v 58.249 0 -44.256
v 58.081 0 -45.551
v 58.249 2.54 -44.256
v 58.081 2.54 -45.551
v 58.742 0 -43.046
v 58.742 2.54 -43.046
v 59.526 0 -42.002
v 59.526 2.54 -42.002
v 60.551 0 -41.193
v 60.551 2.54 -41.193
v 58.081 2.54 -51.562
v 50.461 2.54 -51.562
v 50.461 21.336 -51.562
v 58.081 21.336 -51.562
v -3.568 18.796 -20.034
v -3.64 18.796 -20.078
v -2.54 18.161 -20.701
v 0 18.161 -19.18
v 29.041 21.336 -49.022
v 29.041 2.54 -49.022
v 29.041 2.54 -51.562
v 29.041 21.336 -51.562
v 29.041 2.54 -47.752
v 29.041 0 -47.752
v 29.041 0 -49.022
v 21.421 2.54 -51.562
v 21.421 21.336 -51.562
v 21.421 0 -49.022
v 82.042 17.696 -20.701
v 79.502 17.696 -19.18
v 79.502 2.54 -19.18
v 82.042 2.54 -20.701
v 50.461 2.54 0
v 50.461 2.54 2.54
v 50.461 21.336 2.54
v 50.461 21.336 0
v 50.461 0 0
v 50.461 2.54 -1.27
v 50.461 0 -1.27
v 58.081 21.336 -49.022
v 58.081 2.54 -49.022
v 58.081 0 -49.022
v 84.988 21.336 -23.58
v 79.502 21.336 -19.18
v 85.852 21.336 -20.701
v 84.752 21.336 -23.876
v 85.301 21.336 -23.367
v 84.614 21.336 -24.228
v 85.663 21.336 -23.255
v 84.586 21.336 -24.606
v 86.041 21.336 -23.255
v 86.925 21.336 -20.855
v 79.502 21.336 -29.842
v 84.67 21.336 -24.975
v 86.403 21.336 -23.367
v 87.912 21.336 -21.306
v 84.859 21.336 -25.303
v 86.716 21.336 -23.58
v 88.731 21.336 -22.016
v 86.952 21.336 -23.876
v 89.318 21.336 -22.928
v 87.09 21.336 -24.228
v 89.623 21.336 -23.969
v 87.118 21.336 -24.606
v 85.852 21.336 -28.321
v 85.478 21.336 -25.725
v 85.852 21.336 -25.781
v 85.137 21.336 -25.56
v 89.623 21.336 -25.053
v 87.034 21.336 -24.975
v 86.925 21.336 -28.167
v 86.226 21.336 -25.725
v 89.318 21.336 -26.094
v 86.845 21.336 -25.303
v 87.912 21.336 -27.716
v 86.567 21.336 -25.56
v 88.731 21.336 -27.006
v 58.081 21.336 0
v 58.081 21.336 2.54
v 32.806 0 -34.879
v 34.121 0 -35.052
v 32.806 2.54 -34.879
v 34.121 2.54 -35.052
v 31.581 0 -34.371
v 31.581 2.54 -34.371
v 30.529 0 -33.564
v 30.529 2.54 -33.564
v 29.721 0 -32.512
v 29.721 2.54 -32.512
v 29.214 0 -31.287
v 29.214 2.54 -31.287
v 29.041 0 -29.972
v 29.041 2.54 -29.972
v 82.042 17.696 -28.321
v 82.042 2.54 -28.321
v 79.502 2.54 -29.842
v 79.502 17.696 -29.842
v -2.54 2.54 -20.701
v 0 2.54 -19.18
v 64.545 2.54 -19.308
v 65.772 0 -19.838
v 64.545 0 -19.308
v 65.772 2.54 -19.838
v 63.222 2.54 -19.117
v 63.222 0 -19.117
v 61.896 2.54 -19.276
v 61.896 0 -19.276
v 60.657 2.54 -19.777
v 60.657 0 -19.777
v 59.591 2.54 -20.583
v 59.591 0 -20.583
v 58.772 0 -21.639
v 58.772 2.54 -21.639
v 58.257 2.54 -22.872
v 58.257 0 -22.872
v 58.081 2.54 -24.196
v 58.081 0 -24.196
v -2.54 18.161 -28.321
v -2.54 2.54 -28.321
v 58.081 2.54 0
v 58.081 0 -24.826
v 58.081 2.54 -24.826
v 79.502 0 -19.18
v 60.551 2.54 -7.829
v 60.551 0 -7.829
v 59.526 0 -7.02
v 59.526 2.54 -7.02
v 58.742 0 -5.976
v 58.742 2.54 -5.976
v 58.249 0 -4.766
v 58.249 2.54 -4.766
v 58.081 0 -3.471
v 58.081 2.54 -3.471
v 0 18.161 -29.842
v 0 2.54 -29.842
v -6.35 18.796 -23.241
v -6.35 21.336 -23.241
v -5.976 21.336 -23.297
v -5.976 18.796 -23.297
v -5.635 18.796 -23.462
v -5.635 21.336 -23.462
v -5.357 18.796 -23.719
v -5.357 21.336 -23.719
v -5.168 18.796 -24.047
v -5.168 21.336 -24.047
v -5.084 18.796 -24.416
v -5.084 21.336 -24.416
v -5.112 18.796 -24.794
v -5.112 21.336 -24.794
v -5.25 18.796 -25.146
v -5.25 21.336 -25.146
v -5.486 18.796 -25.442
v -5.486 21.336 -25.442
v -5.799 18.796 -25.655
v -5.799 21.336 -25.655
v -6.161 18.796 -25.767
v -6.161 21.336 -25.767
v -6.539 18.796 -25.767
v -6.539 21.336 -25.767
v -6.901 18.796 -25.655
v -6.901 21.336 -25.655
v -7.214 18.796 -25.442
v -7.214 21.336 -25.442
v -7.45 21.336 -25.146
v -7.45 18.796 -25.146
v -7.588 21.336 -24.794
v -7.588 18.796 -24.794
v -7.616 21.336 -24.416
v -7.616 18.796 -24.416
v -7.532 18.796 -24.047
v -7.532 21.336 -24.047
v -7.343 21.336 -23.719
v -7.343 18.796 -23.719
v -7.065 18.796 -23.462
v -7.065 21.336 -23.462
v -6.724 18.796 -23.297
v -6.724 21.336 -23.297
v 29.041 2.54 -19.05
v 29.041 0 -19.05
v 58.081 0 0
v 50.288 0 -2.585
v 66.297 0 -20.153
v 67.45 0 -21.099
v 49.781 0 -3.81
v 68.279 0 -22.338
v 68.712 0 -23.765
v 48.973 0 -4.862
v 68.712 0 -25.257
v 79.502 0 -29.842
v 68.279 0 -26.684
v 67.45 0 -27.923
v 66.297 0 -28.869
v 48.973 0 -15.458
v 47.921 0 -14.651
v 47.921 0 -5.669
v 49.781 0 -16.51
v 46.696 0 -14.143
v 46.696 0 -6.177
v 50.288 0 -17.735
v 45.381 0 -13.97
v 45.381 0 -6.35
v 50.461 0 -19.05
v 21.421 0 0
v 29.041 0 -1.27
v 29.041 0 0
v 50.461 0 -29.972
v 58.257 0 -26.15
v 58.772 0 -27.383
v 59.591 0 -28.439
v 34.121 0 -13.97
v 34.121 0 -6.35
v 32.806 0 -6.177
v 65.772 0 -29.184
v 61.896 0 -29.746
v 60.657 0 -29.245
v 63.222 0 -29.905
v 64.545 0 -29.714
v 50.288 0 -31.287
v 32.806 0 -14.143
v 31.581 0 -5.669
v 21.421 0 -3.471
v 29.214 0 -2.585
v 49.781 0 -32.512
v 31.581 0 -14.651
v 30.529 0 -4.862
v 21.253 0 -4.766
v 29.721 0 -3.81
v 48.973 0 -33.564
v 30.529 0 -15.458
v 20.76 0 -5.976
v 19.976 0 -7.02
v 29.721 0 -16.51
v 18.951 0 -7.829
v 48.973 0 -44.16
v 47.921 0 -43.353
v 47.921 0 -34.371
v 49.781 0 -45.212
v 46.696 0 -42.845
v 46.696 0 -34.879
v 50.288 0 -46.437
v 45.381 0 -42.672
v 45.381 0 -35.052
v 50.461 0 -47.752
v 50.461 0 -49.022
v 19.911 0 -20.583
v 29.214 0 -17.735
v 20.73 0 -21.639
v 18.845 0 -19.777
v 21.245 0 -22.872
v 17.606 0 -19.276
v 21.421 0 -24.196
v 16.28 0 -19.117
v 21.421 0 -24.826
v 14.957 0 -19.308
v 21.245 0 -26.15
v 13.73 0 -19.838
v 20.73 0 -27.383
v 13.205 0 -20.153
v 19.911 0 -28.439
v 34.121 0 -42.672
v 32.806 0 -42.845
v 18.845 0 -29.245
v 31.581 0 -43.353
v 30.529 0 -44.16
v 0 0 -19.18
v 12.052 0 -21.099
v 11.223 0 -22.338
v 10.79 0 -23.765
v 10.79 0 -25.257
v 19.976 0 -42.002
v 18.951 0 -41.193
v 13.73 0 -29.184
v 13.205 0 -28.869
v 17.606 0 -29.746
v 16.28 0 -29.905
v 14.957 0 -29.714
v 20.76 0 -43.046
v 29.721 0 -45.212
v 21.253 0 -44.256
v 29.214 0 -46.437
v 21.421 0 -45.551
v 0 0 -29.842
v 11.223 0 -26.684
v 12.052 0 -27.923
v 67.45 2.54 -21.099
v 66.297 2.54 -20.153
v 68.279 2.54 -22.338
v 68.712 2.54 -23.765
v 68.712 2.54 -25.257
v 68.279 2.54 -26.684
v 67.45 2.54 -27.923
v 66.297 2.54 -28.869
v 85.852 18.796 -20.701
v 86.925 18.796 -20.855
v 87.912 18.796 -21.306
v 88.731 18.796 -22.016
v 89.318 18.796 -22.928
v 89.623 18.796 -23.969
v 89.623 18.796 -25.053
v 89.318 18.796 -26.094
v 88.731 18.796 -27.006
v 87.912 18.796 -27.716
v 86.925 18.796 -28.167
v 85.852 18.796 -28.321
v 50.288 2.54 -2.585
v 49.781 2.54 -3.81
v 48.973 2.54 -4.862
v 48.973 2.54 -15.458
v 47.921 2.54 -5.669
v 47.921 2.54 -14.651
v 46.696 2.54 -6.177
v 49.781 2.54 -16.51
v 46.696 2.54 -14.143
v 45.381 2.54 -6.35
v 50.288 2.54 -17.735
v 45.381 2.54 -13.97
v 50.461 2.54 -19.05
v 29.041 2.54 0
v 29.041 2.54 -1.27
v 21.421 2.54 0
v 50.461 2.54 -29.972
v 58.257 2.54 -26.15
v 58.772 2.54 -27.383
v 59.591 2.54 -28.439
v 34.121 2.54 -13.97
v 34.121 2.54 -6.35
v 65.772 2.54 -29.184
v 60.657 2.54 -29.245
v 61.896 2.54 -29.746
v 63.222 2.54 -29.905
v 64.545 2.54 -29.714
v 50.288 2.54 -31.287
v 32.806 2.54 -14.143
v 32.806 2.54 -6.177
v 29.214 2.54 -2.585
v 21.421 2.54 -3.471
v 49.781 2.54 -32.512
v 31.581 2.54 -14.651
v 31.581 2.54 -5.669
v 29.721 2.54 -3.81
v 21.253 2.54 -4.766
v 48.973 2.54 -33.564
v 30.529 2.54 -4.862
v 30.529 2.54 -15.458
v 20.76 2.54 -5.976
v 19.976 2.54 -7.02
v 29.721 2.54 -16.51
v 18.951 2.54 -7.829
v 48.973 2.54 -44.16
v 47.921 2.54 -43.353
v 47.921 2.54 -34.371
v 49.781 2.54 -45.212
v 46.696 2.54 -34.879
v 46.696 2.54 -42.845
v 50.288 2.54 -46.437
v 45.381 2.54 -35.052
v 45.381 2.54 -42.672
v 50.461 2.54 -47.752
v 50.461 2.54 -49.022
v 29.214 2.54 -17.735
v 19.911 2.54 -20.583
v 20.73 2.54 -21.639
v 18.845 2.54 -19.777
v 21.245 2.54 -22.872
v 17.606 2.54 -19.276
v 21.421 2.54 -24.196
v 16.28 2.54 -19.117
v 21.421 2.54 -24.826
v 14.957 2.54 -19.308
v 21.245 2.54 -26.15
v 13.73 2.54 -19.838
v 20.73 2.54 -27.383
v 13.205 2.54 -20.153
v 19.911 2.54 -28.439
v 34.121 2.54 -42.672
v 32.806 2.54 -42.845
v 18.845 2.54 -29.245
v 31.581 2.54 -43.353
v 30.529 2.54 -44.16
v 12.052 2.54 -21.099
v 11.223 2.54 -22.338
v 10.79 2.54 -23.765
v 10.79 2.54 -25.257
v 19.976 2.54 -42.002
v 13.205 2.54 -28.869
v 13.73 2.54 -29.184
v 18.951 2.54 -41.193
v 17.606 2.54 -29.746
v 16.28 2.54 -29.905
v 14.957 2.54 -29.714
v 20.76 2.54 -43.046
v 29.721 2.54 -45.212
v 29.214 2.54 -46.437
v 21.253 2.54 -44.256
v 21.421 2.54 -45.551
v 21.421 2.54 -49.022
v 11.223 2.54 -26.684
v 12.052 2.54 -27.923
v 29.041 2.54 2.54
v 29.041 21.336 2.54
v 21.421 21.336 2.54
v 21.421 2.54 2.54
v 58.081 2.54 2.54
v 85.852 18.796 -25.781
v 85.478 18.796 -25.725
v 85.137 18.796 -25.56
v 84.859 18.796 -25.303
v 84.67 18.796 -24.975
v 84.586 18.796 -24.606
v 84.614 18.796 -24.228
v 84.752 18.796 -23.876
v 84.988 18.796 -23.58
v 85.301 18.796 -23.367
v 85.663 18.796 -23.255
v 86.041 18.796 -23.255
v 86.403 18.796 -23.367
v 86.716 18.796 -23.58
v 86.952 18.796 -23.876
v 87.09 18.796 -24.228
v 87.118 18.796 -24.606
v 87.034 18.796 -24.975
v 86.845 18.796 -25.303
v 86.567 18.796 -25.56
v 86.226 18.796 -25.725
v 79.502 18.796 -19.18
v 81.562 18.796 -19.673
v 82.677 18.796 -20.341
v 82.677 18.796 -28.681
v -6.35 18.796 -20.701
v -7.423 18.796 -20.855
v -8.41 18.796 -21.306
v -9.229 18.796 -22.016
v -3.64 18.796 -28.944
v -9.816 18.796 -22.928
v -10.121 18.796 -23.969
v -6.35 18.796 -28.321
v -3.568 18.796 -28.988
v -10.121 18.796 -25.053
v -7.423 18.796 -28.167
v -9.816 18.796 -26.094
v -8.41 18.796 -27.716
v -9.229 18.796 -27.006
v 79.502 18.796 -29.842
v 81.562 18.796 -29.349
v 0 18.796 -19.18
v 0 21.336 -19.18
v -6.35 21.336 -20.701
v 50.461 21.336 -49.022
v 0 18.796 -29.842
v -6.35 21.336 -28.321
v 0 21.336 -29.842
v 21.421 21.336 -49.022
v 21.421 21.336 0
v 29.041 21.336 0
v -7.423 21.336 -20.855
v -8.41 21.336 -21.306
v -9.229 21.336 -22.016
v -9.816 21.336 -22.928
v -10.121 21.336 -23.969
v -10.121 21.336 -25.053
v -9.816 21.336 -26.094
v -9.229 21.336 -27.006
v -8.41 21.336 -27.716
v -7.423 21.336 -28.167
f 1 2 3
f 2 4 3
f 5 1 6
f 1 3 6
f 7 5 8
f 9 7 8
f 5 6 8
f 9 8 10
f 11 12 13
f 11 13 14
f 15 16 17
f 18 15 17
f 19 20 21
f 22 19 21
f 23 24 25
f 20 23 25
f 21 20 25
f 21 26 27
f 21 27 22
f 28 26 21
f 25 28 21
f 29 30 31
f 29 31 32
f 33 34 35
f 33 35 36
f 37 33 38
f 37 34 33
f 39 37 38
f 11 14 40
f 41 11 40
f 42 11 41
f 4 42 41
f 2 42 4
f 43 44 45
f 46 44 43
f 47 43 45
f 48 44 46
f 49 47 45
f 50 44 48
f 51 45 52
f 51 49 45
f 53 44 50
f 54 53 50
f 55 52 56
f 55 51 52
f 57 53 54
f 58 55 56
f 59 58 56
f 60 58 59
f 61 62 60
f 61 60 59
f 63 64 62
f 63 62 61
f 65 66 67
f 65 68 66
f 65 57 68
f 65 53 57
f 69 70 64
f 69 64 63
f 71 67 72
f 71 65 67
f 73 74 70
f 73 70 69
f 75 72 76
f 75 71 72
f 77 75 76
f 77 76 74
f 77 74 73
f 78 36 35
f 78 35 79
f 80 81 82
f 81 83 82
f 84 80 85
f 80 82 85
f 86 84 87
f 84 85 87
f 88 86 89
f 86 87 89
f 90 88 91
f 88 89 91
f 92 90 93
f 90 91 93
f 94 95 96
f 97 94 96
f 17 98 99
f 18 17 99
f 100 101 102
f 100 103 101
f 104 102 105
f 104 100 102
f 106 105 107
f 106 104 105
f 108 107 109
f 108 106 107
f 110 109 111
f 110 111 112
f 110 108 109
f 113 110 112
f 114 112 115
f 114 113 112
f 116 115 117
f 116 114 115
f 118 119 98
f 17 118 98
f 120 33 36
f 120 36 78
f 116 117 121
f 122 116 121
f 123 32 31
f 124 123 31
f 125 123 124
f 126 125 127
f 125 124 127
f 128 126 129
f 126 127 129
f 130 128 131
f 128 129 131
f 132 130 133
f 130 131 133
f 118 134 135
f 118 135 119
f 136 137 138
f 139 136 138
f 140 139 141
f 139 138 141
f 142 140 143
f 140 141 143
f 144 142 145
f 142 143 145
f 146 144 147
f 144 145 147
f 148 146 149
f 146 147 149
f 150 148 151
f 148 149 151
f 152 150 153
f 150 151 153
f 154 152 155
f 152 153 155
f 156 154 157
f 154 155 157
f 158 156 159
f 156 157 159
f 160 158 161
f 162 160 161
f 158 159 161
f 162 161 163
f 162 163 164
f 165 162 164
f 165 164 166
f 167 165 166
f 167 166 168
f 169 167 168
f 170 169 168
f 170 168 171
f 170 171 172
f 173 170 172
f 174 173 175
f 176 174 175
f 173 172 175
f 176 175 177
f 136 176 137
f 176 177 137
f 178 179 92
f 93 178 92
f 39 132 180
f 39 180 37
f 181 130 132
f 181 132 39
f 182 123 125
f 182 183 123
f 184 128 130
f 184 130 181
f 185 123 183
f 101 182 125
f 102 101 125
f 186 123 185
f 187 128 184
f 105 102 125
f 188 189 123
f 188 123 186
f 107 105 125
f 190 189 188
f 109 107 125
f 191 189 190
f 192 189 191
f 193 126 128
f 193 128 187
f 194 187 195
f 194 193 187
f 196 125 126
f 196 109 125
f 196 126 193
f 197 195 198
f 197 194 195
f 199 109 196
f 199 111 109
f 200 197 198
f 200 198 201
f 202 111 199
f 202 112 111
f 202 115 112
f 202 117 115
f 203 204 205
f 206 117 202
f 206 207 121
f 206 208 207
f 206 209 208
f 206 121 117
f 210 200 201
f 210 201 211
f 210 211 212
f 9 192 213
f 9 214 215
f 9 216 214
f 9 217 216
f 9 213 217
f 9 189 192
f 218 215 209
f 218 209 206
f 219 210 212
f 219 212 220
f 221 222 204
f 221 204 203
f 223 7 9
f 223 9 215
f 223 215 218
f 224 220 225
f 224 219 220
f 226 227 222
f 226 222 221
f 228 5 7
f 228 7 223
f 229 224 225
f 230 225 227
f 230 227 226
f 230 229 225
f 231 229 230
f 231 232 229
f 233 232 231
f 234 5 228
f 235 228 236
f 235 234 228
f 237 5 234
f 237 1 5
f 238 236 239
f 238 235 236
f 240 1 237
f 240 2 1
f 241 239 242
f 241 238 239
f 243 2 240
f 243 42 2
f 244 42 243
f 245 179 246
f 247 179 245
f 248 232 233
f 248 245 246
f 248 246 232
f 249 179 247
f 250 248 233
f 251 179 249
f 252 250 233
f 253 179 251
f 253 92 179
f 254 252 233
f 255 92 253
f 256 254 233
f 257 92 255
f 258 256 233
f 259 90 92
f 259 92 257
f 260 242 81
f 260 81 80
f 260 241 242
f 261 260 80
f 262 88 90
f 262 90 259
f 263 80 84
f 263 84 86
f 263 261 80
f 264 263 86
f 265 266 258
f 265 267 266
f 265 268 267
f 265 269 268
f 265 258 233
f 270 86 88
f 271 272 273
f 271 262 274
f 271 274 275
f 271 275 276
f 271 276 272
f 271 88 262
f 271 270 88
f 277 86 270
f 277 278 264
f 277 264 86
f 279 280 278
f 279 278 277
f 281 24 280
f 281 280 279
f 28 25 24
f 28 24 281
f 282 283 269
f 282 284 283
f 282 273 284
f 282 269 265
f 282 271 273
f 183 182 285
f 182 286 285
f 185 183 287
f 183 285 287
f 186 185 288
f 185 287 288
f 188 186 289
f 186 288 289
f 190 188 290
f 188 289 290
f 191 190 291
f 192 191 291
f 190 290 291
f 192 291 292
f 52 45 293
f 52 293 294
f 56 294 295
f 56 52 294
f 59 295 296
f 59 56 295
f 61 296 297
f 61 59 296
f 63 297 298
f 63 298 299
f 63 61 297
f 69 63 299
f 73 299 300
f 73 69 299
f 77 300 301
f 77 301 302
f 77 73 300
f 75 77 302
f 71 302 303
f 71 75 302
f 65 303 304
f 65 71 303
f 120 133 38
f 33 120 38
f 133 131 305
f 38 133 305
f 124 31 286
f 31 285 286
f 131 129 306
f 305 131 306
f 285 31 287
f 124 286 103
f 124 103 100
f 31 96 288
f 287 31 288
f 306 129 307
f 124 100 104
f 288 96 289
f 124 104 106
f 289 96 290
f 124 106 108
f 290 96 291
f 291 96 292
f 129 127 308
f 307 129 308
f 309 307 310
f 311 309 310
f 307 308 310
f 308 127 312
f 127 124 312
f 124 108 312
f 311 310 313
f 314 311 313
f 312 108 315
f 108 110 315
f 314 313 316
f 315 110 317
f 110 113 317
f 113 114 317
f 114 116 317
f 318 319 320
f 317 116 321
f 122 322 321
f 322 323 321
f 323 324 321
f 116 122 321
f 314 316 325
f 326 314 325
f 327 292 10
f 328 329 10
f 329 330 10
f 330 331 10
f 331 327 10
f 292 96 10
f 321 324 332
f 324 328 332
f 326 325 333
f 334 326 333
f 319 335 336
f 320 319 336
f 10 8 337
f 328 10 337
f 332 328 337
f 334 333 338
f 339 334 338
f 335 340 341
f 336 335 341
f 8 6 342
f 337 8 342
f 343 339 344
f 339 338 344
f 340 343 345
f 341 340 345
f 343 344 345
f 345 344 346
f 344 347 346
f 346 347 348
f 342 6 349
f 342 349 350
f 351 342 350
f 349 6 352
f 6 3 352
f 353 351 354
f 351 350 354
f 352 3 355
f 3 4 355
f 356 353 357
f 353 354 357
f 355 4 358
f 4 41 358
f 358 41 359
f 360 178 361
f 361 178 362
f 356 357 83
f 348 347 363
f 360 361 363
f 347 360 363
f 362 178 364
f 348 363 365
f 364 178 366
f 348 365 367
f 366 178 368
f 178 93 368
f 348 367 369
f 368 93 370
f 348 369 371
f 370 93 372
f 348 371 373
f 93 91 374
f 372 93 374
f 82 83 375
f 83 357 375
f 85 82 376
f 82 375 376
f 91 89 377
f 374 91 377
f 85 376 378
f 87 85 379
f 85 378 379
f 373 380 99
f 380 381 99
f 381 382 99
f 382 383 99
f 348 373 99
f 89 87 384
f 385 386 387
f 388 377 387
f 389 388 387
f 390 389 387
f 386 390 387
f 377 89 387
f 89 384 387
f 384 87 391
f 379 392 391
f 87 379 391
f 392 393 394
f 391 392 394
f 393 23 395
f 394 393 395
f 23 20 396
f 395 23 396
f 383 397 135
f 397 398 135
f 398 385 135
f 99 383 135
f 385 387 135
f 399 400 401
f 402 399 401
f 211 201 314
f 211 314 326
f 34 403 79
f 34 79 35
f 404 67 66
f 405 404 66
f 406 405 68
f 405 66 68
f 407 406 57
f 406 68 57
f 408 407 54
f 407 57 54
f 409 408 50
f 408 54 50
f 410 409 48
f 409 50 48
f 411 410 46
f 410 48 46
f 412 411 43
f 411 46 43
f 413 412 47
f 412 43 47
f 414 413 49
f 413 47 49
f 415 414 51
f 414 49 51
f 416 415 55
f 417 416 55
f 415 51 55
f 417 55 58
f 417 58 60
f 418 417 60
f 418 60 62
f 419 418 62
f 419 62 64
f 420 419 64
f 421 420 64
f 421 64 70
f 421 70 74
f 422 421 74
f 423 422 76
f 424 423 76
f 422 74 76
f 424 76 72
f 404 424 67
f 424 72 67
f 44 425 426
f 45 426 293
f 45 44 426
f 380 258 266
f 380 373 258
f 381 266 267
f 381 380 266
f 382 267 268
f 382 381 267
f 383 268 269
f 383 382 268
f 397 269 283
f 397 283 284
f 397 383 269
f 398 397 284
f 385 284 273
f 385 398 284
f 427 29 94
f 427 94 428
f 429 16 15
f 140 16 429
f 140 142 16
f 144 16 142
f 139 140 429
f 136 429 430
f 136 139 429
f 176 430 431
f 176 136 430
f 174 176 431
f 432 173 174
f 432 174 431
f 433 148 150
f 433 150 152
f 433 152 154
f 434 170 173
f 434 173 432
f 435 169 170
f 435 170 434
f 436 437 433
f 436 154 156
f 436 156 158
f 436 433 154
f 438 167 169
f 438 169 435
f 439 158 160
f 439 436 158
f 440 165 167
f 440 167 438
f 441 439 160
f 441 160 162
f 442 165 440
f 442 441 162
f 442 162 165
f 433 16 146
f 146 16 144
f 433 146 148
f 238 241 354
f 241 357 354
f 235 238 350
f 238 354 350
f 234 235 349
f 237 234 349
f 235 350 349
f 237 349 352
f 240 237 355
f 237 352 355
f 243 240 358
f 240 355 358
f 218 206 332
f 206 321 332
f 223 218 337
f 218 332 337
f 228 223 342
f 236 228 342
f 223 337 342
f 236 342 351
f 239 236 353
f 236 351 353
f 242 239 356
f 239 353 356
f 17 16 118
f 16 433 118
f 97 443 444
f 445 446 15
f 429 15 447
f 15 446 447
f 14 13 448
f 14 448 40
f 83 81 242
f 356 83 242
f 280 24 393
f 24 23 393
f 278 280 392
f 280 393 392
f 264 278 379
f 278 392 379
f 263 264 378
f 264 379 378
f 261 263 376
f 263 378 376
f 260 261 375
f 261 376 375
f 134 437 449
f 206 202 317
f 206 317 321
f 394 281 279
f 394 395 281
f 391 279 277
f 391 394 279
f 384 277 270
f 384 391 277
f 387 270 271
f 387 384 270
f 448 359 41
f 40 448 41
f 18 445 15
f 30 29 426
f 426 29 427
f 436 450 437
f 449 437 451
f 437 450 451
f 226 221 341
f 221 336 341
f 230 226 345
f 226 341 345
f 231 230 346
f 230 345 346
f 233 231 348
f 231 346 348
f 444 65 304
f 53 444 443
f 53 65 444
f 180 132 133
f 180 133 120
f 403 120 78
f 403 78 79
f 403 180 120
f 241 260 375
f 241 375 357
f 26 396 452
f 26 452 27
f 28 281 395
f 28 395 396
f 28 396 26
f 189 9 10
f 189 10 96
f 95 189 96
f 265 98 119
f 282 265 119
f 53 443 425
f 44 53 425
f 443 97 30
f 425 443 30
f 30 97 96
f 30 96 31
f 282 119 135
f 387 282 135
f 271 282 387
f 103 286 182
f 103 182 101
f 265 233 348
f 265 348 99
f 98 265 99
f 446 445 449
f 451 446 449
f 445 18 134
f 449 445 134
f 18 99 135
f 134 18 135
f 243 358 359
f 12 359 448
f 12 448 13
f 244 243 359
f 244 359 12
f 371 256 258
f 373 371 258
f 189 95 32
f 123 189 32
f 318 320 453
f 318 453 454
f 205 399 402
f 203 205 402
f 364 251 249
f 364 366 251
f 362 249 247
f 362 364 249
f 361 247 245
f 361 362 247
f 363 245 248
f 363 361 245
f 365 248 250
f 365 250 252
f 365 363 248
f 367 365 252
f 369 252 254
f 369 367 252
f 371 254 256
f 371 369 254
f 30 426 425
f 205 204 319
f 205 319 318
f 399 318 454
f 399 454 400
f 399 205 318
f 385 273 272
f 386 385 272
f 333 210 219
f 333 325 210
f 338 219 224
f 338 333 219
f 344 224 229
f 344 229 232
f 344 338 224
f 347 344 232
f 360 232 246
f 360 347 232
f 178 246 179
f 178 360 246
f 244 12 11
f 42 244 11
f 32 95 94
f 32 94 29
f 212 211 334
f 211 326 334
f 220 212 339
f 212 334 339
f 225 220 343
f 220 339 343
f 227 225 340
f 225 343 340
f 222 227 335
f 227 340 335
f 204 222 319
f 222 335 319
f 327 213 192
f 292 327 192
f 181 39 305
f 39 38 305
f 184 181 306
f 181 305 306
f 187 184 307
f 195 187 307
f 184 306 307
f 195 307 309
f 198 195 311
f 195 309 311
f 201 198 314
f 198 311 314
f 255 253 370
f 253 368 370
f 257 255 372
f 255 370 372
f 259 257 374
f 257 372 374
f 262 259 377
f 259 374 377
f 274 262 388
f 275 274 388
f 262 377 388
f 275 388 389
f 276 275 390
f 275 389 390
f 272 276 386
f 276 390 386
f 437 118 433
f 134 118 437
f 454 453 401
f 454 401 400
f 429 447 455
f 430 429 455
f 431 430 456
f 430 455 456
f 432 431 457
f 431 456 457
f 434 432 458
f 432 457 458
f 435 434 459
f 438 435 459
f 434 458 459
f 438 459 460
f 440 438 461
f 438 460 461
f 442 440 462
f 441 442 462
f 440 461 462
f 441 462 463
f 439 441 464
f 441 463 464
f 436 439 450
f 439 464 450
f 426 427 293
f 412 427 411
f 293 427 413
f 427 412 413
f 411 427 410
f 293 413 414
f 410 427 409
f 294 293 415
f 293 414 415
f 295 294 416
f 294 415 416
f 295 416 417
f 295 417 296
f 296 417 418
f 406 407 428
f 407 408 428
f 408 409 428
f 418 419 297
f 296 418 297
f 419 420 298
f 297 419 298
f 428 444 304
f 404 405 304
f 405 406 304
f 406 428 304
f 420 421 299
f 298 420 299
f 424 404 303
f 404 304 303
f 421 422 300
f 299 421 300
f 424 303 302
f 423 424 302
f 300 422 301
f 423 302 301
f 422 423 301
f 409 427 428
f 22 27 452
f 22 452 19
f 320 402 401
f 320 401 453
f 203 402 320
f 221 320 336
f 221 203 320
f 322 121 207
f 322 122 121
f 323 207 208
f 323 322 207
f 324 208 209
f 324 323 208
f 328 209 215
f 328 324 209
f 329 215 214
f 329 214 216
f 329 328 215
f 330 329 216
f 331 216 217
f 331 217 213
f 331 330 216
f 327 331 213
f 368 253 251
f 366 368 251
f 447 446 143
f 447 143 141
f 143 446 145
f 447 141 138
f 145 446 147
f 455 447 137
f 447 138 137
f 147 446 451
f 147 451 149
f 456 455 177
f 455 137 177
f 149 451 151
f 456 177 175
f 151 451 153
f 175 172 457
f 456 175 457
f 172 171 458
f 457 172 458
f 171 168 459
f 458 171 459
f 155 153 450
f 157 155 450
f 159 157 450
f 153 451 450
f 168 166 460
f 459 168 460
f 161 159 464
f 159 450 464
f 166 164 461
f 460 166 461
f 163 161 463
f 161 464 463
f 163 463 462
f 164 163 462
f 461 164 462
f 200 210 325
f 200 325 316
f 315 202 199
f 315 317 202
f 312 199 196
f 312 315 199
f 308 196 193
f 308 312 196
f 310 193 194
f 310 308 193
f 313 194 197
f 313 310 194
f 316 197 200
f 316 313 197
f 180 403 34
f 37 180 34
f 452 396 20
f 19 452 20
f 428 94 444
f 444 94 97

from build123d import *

# Parameters (mm, degrees)
SKETCH1_W           = 21.420666666
SKETCH1_H           = 21.082
BOSS_EXTRUDE1_DEPTH = 2.54
SKETCH2_W           = 7.62
SKETCH2_H           = 2.54
BOSS_EXTRUDE2_DEPTH = 18.796
FILLET1_R           = 5.08
CHAMFER1_SIZE       = 2.54
SKETCH3_R           = 1.27
BOSS_EXTRUDE3_DEPTH = 2.54
CHAMFER2_SIZE       = 0.635
CHAMFER2_SIZE_2     = 1.099852263


with BuildPart() as part:
    # Sketch1 → Boss-Extrude1 (new body)
    with BuildSketch(Plane(origin=(0, 0, 0), x_dir=(1, 0, 0), z_dir=(0, 1, 0))):
        Polygon((-2.54, 28.321), (21.420666667, 42.672), (21.420666667, 51.562), (29.040666667, 51.562), (29.040666667, 42.672), (50.461333333, 42.672), (50.461333333, 51.562), (58.081333333, 51.562), (58.081333333, 42.672), (82.042, 28.321), (82.042, 20.701), (58.081333333, 6.35), (58.081333333, -2.54), (50.461333333, -2.54), (50.461333333, 6.35), (29.040666667, 6.35), (29.040666667, -2.54), (21.420666667, -2.54), (21.420666667, 6.35), (-2.54, 20.701), align=None)
        Polygon((5.928658004, 24.511), (21.420666667, 33.789782574), (21.420666667, 15.232217426), align=None, mode=Mode.SUBTRACT)
        with Locations((39.751, 24.511)):
            Rectangle(SKETCH1_W, SKETCH1_H, mode=Mode.SUBTRACT)
        Polygon((58.081333333, 33.789782574), (73.573341996, 24.511), (58.081333333, 15.232217426), align=None, mode=Mode.SUBTRACT)
    extrude(amount=BOSS_EXTRUDE1_DEPTH)

    # Sketch2 → Boss-Extrude2 (add)
    with BuildSketch(Plane(origin=(0, 2.54, 0), x_dir=(1, 0, 0), z_dir=(0, 1, 0))):
        with Locations((25.230666667, 50.292)):
            Rectangle(SKETCH2_W, SKETCH2_H)
        with Locations((54.271333333, 50.292)):
            Rectangle(SKETCH2_W, SKETCH2_H)
        with Locations((25.230666667, -1.27)):
            Rectangle(SKETCH2_W, SKETCH2_H)
        with Locations((54.271333333, -1.27)):
            Rectangle(SKETCH2_W, SKETCH2_H)
        Polygon((-2.54, 20.701), (0, 19.17969258), (0, 29.84230742), (-2.54, 28.321), align=None)
        Polygon((82.042, 28.321), (79.502, 29.84230742), (79.502, 19.17969258), (82.042, 20.701), align=None)
    extrude(amount=BOSS_EXTRUDE2_DEPTH)

    # Fillet1
    fillet1_edges = [part.edges().sort_by_distance(p)[0] for p in [
        (29.040666667, 1.27, -42.672),
        (50.461333333, 1.27, -42.672),
        (58.081333333, 1.27, -42.672),
        (58.081333333, 1.27, -6.35),
        (50.461333333, 1.27, -6.35),
        (29.040666667, 1.27, -6.35),
        (21.420666667, 1.27, -6.35),
        (21.420666667, 1.27, -42.672),
        (5.928658004, 1.27, -24.511),
        (21.420666667, 1.27, -15.232217426),
        (21.420666667, 1.27, -33.789782574),
        (58.081333333, 1.27, -15.232217426),
        (73.573341996, 1.27, -24.511),
        (58.081333333, 1.27, -33.789782574),
        (29.040666667, 1.27, -35.052),
        (29.040666667, 1.27, -13.97),
        (50.461333333, 1.27, -13.97),
        (50.461333333, 1.27, -35.052),
    ]]
    fillet(fillet1_edges, radius=FILLET1_R)

    # Chamfer1
    chamfer1_edges = [part.edges().sort_by_distance(p)[0] for p in [
        (25.230666667, 0, -51.562),
        (54.271333333, 0, -51.562),
        (82.042, 0, -24.511),
        (54.271333333, 0, 2.54),
        (25.230666667, 0, 2.54),
        (-2.54, 0, -24.511),
    ]]
    chamfer(chamfer1_edges, length=CHAMFER1_SIZE)

    # Sketch3 → Boss-Extrude3 (add)
    # profile 1 of 2: a face of its own
    with BuildSketch(Plane(origin=(0, 21.336, 0), x_dir=(1, 0, 0), z_dir=(0, 1, 0))):
        with BuildLine():
            Line((-6.35, 28.321), (0, 29.84230742))
            Line((0, 29.84230742), (0, 19.17969258))
            Line((0, 19.17969258), (-6.35, 20.701))
            ThreePointArc((-6.35, 20.701), (-10.16, 24.511), (-6.35, 28.321))
        make_face()
        with Locations(Location((-6.35, 24.511, 0), (0, 0, 270))):
            Circle(SKETCH3_R, mode=Mode.SUBTRACT)
    # profile 2 of 2: a face of its own
    with BuildSketch(Plane(origin=(0, 21.336, 0), x_dir=(1, 0, 0), z_dir=(0, 1, 0))):
        with BuildLine():
            Line((79.502, 19.17969258), (85.852, 20.701))
            ThreePointArc((85.852, 20.701), (89.662, 24.511), (85.852, 28.321))
            Line((85.852, 28.321), (79.502, 29.84230742))
            Line((79.502, 29.84230742), (79.502, 19.17969258))
        make_face()
        with Locations(Location((85.852, 24.511, 0), (0, 0, 90))):
            Circle(SKETCH3_R, mode=Mode.SUBTRACT)
    extrude(amount=-BOSS_EXTRUDE3_DEPTH)

    # Chamfer2
    # the kernel refuses this chamfer: 1.099852263, 0.635 mm, written as the material it adds along each edge
    with BuildSketch(Plane(origin=(2.441061654, 18.796, -31.304356715), x_dir=(0, -1, 0), z_dir=(-0.8578938832772348, 0, 0.5138269018215241))) as chamfer2_piece_1_section:
        Polygon((CHAMFER2_SIZE, 0), (0, -CHAMFER2_SIZE_2), (0, 0), align=None)
    chamfer2_piece_1 = extrude(amount=8.651563385, mode=Mode.PRIVATE)
    chamfer2_piece_1 = split(chamfer2_piece_1, bisect_by=Plane(origin=(-2.54, 18.796, -31.304356715), z_dir=(1, 0, 0)), keep=Keep.TOP, mode=Mode.PRIVATE)
    chamfer2_piece_1 = split(chamfer2_piece_1, bisect_by=Plane(origin=(2.639816898, 18.796, -30.474744119), z_dir=(0.2329830326651444, 0, 0.9724808000624754)), keep=Keep.TOP, mode=Mode.PRIVATE)
    add(chamfer2_piece_1)
    with BuildSketch(Plane(origin=(-2.54, 18.796, -31.166412121), x_dir=(-1, 0, 0), z_dir=(0, 0, 1))) as chamfer2_piece_2_section:
        Polygon((CHAMFER2_SIZE_2, 0), (0, CHAMFER2_SIZE), (0, 0), align=None)
    chamfer2_piece_2 = extrude(amount=13.310824243, mode=Mode.PRIVATE)
    chamfer2_piece_2 = split(chamfer2_piece_2, bisect_by=Plane(origin=(-1.285716853, 18.796, -29.072240259), z_dir=(0.5138269018215241, 0, 0.8578938832772348)), keep=Keep.TOP, mode=Mode.PRIVATE)
    chamfer2_piece_2 = split(chamfer2_piece_2, bisect_by=Plane(origin=(-7.153247393, 18.796, -23.464058067), z_dir=(0.5138269018215242, 0, -0.8578938832772348)), keep=Keep.TOP, mode=Mode.PRIVATE)
    add(chamfer2_piece_2)
    with BuildSketch(Plane(origin=(-4.981061654, 18.796, -22.163049295), x_dir=(-0.5138269018215241, -3.2301735414316882e-15, 0.8578938832772347), z_dir=(0.8578938832772348, 0, 0.5138269018215242))) as chamfer2_piece_3_section:
        Polygon((CHAMFER2_SIZE_2, 0), (0, CHAMFER2_SIZE), (0, 0), align=None)
    chamfer2_piece_3 = extrude(amount=8.651563385, mode=Mode.PRIVATE)
    chamfer2_piece_3 = split(chamfer2_piece_3, bisect_by=Plane(origin=(-2.54, 18.796, -22.163049295), z_dir=(1, 0, 0)), keep=Keep.TOP, mode=Mode.PRIVATE)
    chamfer2_piece_3 = split(chamfer2_piece_3, bisect_by=Plane(origin=(-5.386627864, 18.796, -20.470199184), z_dir=(0.2329830326651444, 0, -0.9724808000624754)), keep=Keep.TOP, mode=Mode.PRIVATE)
    add(chamfer2_piece_3)
    with BuildSketch(Plane(origin=(82.042, 18.796, -31.166412121), x_dir=(0, -1, 0), z_dir=(0, 0, 1))) as chamfer2_piece_4_section:
        Polygon((CHAMFER2_SIZE_2, 0), (0, CHAMFER2_SIZE), (0, 0), align=None)
    chamfer2_piece_4 = extrude(amount=13.310824243, mode=Mode.PRIVATE)
    chamfer2_piece_4 = split(chamfer2_piece_4, bisect_by=Plane(origin=(80.787716853, 18.796, -29.072240259), z_dir=(-0.5138269018215241, 0, 0.8578938832772348)), keep=Keep.TOP, mode=Mode.PRIVATE)
    chamfer2_piece_4 = split(chamfer2_piece_4, bisect_by=Plane(origin=(86.655247393, 18.796, -23.464058067), z_dir=(-0.5138269018215241, 0, -0.8578938832772349)), keep=Keep.TOP, mode=Mode.PRIVATE)
    add(chamfer2_piece_4)
    with BuildSketch(Plane(origin=(84.483061654, 18.796, -22.163049295), x_dir=(0, -1, 0), z_dir=(-0.8578938832772349, 0, 0.5138269018215241))) as chamfer2_piece_5_section:
        Polygon((CHAMFER2_SIZE_2, 0), (0, CHAMFER2_SIZE), (0, 0), align=None)
    chamfer2_piece_5 = extrude(amount=8.651563385, mode=Mode.PRIVATE)
    chamfer2_piece_5 = split(chamfer2_piece_5, bisect_by=Plane(origin=(82.042, 18.796, -22.163049295), z_dir=(-1, 0, 0)), keep=Keep.TOP, mode=Mode.PRIVATE)
    chamfer2_piece_5 = split(chamfer2_piece_5, bisect_by=Plane(origin=(84.888627864, 18.796, -20.470199184), z_dir=(-0.23298303266514464, 0, -0.9724808000624754)), keep=Keep.TOP, mode=Mode.PRIVATE)
    add(chamfer2_piece_5)
    with BuildSketch(Plane(origin=(77.060938346, 18.796, -31.304356715), x_dir=(0, -1, 0), z_dir=(0.8578938832772348, 0, 0.5138269018215241))) as chamfer2_piece_6_section:
        Polygon((CHAMFER2_SIZE_2, 0), (0, CHAMFER2_SIZE), (0, 0), align=None)
    chamfer2_piece_6 = extrude(amount=8.651563385, mode=Mode.PRIVATE)
    chamfer2_piece_6 = split(chamfer2_piece_6, bisect_by=Plane(origin=(82.042, 18.796, -31.304356715), z_dir=(-1, 0, 0)), keep=Keep.TOP, mode=Mode.PRIVATE)
    chamfer2_piece_6 = split(chamfer2_piece_6, bisect_by=Plane(origin=(76.862183102, 18.796, -30.474744119), z_dir=(-0.23298303266514414, 0, 0.9724808000624755)), keep=Keep.TOP, mode=Mode.PRIVATE)
    add(chamfer2_piece_6)
    with BuildSketch(Plane(origin=(2.441061654, 18.796, -31.304356715), x_dir=(0, -1, 0), z_dir=(-0.8578938832772348, 0, 0.5138269018215241))) as chamfer2_piece_7a_section:
        Polygon((CHAMFER2_SIZE, 0), (0, -CHAMFER2_SIZE_2), (0, 0), align=None)
    chamfer2_piece_7a = extrude(amount=8.651563385, mode=Mode.PRIVATE)
    chamfer2_piece_7a = split(chamfer2_piece_7a, bisect_by=Plane(origin=(-2.54, 18.796, -31.304356715), z_dir=(-1, 0, 0)), keep=Keep.TOP, mode=Mode.PRIVATE)
    chamfer2_piece_7a = split(chamfer2_piece_7a, bisect_by=Plane(origin=(2.639816898, 18.796, -30.474744119), z_dir=(0.2329830326651444, 0, 0.9724808000624754)), keep=Keep.TOP, mode=Mode.PRIVATE)
    with BuildSketch(Plane(origin=(-2.54, 18.796, -31.166412121), x_dir=(-1, 0, 0), z_dir=(0, 0, 1))) as chamfer2_piece_7b_section:
        Polygon((CHAMFER2_SIZE_2, 0), (0, CHAMFER2_SIZE), (0, 0), align=None)
    chamfer2_piece_7b = extrude(amount=13.310824243, mode=Mode.PRIVATE)
    chamfer2_piece_7b = split(chamfer2_piece_7b, bisect_by=Plane(origin=(-1.285716853, 18.796, -29.072240259), z_dir=(-0.5138269018215241, 0, -0.8578938832772348)), keep=Keep.TOP, mode=Mode.PRIVATE)
    chamfer2_piece_7b = split(chamfer2_piece_7b, bisect_by=Plane(origin=(-2.1021216, 18.796, -29.338689596), z_dir=(0.2329830326651444, 0, 0.9724808000624754)), keep=Keep.TOP, mode=Mode.PRIVATE)
    chamfer2_piece_7 = chamfer2_piece_7a & chamfer2_piece_7b
    add(chamfer2_piece_7)
    with BuildSketch(Plane(origin=(-4.981061654, 18.796, -22.163049295), x_dir=(-0.5138269018215241, -3.2301735414316882e-15, 0.8578938832772347), z_dir=(0.8578938832772348, 0, 0.5138269018215242))) as chamfer2_piece_8a_section:
        Polygon((CHAMFER2_SIZE_2, 0), (0, CHAMFER2_SIZE), (0, 0), align=None)
    chamfer2_piece_8a = extrude(amount=8.651563385, mode=Mode.PRIVATE)
    chamfer2_piece_8a = split(chamfer2_piece_8a, bisect_by=Plane(origin=(-2.54, 18.796, -22.163049295), z_dir=(-1, 0, 0)), keep=Keep.TOP, mode=Mode.PRIVATE)
    chamfer2_piece_8a = split(chamfer2_piece_8a, bisect_by=Plane(origin=(-5.386627864, 18.796, -20.470199184), z_dir=(0.2329830326651444, 0, -0.9724808000624754)), keep=Keep.TOP, mode=Mode.PRIVATE)
    with BuildSketch(Plane(origin=(-2.54, 18.796, -31.166412121), x_dir=(-1, 0, 0), z_dir=(0, 0, 1))) as chamfer2_piece_8b_section:
        Polygon((CHAMFER2_SIZE_2, 0), (0, CHAMFER2_SIZE), (0, 0), align=None)
    chamfer2_piece_8b = extrude(amount=13.310824243, mode=Mode.PRIVATE)
    chamfer2_piece_8b = split(chamfer2_piece_8b, bisect_by=Plane(origin=(-7.153247393, 18.796, -23.464058067), z_dir=(-0.5138269018215242, 0, 0.8578938832772348)), keep=Keep.TOP, mode=Mode.PRIVATE)
    chamfer2_piece_8b = split(chamfer2_piece_8b, bisect_by=Plane(origin=(-5.117975361, 18.796, -20.4058365), z_dir=(0.2329830326651444, 0, -0.9724808000624754)), keep=Keep.TOP, mode=Mode.PRIVATE)
    chamfer2_piece_8 = chamfer2_piece_8a & chamfer2_piece_8b
    add(chamfer2_piece_8)
    with BuildSketch(Plane(origin=(77.060938346, 18.796, -31.304356715), x_dir=(0, -1, 0), z_dir=(0.8578938832772348, 0, 0.5138269018215241))) as chamfer2_piece_9a_section:
        Polygon((CHAMFER2_SIZE_2, 0), (0, CHAMFER2_SIZE), (0, 0), align=None)
    chamfer2_piece_9a = extrude(amount=8.651563385, mode=Mode.PRIVATE)
    chamfer2_piece_9a = split(chamfer2_piece_9a, bisect_by=Plane(origin=(82.042, 18.796, -31.304356715), z_dir=(1, 0, 0)), keep=Keep.TOP, mode=Mode.PRIVATE)
    with BuildSketch(Plane(origin=(82.042, 18.796, -31.166412121), x_dir=(0, -1, 0), z_dir=(0, 0, 1))) as chamfer2_piece_9b_section:
        Polygon((CHAMFER2_SIZE_2, 0), (0, CHAMFER2_SIZE), (0, 0), align=None)
    chamfer2_piece_9b = extrude(amount=13.310824243, mode=Mode.PRIVATE)
    chamfer2_piece_9b = split(chamfer2_piece_9b, bisect_by=Plane(origin=(80.787716853, 18.796, -29.072240259), z_dir=(0.5138269018215241, 0, -0.8578938832772348)), keep=Keep.TOP, mode=Mode.PRIVATE)
    chamfer2_piece_9b = split(chamfer2_piece_9b, bisect_by=Plane(origin=(81.6041216, 18.796, -29.338689596), z_dir=(-0.23298303266514414, 0, 0.9724808000624755)), keep=Keep.TOP, mode=Mode.PRIVATE)
    chamfer2_piece_9 = chamfer2_piece_9a & chamfer2_piece_9b
    add(chamfer2_piece_9)
    with BuildSketch(Plane(origin=(84.483061654, 18.796, -22.163049295), x_dir=(0, -1, 0), z_dir=(-0.8578938832772349, 0, 0.5138269018215241))) as chamfer2_piece_10a_section:
        Polygon((CHAMFER2_SIZE_2, 0), (0, CHAMFER2_SIZE), (0, 0), align=None)
    chamfer2_piece_10a = extrude(amount=8.651563385, mode=Mode.PRIVATE)
    chamfer2_piece_10a = split(chamfer2_piece_10a, bisect_by=Plane(origin=(82.042, 18.796, -22.163049295), z_dir=(1, 0, 0)), keep=Keep.TOP, mode=Mode.PRIVATE)
    with BuildSketch(Plane(origin=(82.042, 18.796, -31.166412121), x_dir=(0, -1, 0), z_dir=(0, 0, 1))) as chamfer2_piece_10b_section:
        Polygon((CHAMFER2_SIZE_2, 0), (0, CHAMFER2_SIZE), (0, 0), align=None)
    chamfer2_piece_10b = extrude(amount=13.310824243, mode=Mode.PRIVATE)
    chamfer2_piece_10b = split(chamfer2_piece_10b, bisect_by=Plane(origin=(86.655247393, 18.796, -23.464058067), z_dir=(0.5138269018215241, 0, 0.8578938832772349)), keep=Keep.TOP, mode=Mode.PRIVATE)
    chamfer2_piece_10b = split(chamfer2_piece_10b, bisect_by=Plane(origin=(84.619975361, 18.796, -20.4058365), z_dir=(-0.23298303266514464, 0, -0.9724808000624754)), keep=Keep.TOP, mode=Mode.PRIVATE)
    chamfer2_piece_10 = chamfer2_piece_10a & chamfer2_piece_10b
    add(chamfer2_piece_10)


solid = part.part
